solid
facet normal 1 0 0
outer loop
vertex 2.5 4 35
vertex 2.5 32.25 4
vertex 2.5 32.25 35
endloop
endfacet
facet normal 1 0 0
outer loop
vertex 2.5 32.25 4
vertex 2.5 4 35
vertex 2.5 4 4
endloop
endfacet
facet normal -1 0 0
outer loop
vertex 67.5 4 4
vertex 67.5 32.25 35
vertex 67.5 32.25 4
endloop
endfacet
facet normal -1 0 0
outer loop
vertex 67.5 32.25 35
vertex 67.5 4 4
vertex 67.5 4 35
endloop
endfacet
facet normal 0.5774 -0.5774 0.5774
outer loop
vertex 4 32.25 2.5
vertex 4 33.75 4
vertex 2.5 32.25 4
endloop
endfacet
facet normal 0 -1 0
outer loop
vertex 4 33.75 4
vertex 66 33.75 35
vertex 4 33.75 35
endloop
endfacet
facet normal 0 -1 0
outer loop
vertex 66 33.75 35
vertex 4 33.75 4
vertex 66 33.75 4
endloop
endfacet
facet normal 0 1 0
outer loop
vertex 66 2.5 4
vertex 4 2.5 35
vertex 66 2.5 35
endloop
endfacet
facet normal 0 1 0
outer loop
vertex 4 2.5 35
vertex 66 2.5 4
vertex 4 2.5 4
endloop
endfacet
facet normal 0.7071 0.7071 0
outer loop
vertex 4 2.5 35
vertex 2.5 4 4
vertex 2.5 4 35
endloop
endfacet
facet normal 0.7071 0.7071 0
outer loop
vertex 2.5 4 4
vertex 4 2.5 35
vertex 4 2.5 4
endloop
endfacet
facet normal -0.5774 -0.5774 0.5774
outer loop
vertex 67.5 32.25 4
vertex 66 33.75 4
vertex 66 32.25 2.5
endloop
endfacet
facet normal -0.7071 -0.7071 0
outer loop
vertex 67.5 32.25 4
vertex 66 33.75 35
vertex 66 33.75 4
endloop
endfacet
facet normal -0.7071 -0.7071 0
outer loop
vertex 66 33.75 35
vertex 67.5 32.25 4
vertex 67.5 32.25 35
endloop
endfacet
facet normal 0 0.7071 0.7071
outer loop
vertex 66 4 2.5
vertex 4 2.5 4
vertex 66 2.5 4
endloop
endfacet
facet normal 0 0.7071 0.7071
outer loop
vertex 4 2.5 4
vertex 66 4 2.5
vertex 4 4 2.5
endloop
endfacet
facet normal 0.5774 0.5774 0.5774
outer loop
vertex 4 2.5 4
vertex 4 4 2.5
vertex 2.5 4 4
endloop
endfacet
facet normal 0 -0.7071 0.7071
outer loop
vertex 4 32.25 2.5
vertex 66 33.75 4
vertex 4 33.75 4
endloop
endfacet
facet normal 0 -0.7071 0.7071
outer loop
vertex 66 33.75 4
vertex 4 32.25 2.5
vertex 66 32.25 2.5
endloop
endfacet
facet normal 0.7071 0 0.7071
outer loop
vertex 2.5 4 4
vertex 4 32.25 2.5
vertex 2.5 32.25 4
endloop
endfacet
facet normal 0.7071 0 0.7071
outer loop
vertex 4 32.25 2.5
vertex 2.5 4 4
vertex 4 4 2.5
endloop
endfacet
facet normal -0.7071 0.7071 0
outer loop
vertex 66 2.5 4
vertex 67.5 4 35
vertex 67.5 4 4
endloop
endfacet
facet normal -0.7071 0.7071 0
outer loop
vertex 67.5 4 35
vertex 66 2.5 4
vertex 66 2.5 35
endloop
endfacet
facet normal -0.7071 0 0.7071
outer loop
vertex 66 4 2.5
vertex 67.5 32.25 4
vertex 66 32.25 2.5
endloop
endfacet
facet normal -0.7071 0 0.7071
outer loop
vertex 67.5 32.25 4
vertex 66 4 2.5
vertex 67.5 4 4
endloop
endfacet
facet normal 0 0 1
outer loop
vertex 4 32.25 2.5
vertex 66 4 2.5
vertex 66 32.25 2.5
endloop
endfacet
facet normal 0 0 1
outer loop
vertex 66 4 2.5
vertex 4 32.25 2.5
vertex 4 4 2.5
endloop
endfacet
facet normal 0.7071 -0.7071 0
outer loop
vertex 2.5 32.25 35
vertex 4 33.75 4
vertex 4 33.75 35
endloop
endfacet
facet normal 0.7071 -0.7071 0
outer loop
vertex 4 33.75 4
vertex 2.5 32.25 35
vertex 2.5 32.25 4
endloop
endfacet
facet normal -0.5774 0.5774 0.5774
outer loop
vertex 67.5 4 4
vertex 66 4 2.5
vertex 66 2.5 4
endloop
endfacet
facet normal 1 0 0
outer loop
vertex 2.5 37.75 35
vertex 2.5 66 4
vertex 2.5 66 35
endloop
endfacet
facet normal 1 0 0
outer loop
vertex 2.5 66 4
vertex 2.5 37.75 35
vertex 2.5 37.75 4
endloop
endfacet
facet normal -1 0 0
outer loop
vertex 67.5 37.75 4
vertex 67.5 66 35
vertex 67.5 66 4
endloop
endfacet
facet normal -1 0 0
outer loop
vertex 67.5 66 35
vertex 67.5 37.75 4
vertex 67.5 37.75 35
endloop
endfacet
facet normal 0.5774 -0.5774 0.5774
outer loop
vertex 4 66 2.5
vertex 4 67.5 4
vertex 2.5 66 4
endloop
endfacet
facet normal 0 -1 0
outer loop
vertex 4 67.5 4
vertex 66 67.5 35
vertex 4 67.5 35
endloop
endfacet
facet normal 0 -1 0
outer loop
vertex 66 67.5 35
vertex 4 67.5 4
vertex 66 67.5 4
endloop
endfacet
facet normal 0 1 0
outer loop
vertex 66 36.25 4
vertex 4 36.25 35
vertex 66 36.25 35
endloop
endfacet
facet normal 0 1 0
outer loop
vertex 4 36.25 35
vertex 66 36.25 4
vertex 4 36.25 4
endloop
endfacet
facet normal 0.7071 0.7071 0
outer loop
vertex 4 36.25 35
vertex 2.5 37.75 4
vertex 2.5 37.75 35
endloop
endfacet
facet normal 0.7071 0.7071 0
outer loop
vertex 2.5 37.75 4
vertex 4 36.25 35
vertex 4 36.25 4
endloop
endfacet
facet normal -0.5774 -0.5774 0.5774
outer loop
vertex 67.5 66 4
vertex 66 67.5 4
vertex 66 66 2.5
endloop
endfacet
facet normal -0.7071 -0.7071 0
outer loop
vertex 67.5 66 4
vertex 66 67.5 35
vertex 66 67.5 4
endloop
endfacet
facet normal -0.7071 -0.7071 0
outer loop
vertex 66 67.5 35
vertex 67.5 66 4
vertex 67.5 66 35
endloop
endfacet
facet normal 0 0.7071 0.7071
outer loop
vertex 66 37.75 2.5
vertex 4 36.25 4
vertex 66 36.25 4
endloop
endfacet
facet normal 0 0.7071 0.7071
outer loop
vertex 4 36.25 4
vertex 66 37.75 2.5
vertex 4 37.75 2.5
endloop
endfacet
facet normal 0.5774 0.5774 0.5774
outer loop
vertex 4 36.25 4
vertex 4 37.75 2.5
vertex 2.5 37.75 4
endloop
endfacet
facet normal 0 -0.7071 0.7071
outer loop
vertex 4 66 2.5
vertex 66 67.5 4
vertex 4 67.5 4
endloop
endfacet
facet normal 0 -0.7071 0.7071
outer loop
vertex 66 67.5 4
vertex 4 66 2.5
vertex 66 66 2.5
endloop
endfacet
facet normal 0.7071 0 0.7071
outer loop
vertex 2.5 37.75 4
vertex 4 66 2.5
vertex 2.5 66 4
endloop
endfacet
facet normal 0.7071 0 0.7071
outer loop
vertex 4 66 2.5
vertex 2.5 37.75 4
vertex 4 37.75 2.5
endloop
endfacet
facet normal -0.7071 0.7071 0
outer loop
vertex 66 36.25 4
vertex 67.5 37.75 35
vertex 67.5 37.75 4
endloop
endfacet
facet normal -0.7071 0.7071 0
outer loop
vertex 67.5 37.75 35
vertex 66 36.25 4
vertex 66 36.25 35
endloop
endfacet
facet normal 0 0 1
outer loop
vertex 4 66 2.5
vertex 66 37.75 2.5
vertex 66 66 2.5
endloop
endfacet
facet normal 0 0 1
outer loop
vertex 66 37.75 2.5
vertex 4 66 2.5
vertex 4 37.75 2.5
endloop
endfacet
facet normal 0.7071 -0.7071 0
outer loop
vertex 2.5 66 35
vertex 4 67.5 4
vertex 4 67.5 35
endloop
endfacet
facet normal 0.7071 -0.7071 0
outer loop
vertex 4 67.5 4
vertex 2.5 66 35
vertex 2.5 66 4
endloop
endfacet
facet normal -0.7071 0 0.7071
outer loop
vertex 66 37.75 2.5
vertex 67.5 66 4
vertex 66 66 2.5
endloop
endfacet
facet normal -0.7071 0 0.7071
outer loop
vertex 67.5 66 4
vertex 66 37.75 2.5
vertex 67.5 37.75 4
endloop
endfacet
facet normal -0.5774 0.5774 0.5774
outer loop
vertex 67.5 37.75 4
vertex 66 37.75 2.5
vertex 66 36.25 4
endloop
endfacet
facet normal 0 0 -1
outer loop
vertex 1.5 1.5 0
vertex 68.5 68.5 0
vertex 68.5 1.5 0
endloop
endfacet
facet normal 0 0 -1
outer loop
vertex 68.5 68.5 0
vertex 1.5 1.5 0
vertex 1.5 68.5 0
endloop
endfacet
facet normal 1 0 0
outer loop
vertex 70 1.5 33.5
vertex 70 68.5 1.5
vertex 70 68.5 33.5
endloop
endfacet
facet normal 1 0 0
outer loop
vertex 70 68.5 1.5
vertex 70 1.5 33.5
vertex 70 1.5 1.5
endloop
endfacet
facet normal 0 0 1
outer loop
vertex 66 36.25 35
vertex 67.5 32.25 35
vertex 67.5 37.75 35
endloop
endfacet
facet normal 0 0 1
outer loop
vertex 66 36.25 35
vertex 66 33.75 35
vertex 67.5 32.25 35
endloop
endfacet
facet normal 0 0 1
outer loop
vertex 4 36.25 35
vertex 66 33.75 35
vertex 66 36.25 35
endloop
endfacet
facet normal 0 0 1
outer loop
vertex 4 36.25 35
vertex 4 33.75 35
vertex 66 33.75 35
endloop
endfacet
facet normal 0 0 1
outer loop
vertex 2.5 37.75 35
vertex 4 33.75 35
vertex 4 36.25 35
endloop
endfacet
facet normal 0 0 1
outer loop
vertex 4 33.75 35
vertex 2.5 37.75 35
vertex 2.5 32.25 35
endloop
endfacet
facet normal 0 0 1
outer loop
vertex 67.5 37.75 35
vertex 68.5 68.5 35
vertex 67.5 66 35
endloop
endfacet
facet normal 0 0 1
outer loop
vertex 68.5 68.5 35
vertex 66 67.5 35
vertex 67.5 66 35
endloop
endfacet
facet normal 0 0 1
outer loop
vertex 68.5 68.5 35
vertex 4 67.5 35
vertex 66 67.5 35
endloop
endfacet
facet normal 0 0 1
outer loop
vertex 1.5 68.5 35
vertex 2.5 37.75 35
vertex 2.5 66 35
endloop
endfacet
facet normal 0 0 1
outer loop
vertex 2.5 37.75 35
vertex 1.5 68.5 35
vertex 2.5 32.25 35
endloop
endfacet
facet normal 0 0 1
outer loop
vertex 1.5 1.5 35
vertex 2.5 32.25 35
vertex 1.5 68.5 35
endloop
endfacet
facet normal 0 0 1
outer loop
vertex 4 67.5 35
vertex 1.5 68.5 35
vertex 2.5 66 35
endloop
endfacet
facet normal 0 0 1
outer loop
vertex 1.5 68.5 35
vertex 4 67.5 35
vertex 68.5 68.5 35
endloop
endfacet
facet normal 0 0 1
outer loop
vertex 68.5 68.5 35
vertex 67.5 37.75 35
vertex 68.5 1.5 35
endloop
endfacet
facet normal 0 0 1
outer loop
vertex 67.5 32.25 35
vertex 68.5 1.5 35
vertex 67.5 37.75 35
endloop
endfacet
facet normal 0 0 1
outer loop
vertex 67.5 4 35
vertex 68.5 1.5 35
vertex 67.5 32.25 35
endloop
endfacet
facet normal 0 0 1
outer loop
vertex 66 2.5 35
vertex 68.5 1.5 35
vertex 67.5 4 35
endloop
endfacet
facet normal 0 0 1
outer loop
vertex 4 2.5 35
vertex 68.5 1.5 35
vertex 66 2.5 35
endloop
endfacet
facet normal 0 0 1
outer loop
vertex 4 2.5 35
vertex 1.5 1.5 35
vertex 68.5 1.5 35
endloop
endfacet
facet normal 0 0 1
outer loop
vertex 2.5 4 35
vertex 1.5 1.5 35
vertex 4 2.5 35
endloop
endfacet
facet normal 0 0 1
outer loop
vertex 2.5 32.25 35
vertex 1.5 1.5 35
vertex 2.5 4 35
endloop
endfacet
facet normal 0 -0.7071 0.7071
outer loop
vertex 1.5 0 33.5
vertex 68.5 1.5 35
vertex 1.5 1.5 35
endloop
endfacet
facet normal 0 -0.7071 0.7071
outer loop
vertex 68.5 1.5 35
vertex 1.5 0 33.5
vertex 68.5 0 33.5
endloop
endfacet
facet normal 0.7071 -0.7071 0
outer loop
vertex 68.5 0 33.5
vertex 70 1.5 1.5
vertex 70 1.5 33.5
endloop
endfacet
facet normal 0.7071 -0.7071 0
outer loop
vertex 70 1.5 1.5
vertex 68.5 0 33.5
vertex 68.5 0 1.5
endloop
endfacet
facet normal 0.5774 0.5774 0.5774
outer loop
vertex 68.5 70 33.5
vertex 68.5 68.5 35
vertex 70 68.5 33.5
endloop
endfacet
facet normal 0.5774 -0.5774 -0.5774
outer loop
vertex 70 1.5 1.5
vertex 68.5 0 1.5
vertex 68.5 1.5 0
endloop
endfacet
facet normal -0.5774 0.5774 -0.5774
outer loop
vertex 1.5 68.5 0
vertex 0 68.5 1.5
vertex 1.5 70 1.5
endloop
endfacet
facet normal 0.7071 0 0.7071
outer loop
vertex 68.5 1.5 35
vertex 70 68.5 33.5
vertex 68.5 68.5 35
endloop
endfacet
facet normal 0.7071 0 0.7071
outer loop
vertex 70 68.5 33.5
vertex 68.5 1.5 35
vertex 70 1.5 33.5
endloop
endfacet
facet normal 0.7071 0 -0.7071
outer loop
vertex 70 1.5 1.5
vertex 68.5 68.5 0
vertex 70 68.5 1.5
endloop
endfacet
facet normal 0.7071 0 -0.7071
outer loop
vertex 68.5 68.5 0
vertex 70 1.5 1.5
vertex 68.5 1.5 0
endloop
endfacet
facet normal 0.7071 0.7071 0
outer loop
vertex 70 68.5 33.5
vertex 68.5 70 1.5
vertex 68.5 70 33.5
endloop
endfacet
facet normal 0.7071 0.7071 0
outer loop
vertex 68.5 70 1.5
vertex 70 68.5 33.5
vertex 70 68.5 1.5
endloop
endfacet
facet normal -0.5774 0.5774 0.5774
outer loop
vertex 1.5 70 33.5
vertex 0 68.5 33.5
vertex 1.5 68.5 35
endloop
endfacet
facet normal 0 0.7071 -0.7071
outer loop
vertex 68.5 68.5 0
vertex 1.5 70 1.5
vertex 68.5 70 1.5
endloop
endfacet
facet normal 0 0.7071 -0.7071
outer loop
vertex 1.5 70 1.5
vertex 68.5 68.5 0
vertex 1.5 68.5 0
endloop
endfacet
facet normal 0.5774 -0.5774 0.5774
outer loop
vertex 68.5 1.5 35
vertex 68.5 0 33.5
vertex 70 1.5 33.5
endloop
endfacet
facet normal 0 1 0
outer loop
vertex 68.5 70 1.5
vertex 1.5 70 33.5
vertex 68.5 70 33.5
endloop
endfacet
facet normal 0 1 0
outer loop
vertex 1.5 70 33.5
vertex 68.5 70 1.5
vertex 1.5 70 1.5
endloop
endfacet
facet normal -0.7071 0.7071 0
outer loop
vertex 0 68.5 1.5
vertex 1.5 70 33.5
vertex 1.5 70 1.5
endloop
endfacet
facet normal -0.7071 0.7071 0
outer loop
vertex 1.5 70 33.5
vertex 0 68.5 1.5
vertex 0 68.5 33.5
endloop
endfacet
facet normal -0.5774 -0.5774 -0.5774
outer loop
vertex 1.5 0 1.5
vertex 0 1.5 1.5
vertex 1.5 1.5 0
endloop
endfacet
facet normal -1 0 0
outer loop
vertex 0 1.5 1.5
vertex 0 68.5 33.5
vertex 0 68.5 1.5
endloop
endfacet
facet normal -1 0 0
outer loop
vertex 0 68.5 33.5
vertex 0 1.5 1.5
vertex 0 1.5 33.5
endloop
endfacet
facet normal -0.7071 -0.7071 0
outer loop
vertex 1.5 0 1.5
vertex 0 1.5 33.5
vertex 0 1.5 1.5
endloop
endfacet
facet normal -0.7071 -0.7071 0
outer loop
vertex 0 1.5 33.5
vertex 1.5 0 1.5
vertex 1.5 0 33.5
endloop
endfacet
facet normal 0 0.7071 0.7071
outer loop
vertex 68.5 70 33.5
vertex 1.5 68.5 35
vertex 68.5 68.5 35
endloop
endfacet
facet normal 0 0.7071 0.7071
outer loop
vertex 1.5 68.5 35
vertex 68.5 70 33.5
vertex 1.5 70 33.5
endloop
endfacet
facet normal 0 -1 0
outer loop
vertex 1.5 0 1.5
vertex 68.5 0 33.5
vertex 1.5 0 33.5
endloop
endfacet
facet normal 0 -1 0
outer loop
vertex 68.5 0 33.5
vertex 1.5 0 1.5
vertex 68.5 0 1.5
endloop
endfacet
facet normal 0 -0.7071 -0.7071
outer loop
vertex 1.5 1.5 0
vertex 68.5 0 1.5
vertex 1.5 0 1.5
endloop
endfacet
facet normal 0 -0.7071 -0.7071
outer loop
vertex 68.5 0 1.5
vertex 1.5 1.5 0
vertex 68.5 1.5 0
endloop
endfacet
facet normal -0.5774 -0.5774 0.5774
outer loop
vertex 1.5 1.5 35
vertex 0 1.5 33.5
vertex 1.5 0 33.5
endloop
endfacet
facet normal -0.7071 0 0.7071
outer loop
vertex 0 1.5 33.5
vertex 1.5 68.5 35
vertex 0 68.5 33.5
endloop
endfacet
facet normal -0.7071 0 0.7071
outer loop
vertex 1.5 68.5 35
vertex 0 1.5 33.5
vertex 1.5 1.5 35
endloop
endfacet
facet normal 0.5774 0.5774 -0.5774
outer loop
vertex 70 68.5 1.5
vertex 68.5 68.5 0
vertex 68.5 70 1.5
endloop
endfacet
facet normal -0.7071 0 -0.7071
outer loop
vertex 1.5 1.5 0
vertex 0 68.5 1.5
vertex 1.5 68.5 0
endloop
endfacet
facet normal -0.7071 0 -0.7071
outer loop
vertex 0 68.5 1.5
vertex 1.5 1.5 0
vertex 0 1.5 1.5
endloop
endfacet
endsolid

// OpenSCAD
$fn = 90;

/* Dimensions */

width = 70;
height = 35;
wallthickness = 2.5;
divisions = 2;

/* Dimensions */

chamfer = wallthickness/5*3; // 2/sqrt(2);
dividerMultiplier = chamfer; // wallthickness/5*3 or 1.5
    
/**/

module chamferedCube(xyz, chamfer){
  c2 = chamfer * 2;
  a = [xyz[0] - c2, xyz[1] - c2, xyz[2]];
  b = [xyz[0] - c2, xyz[1], xyz[2] - c2];
  c = [xyz[0], xyz[1] - c2, xyz[2] - c2];
  hull(){
    translate([chamfer,chamfer,0])
      cube(a);
    translate([chamfer,0,chamfer])
      cube(b);
    translate([0,chamfer,chamfer])
      cube(c);
    }
  }
	
module dividers(d) {

  t = wallthickness;
	t1 = t*1.5;
	t2 = t/2;
	w = width;
	w2 = width/2;
	w3 = width/3;
	c = chamfer;
	m = dividerMultiplier;
	
  if (d == 1){
		translate([t,t,t])
      chamferedCube([w-t*2,w-t*2,height], c);
    }
  else if (d == 2){
		translate([t,t,t])
      chamferedCube([w-t*2,w2-t*m,height], c);
		translate([t,w/2+t/2,t])
      chamferedCube([w-t*2,w2-t*m,height], c);
    }
  else if (d == 3){
		translate([t,t,t])
      chamferedCube([w-t*2,w3-t*m,height], c);
		translate([t,w3+t/3*2,t])
      chamferedCube([w-t*2,w3-t*m,height], c);
		translate([t,w3*2+t/3,t])
      chamferedCube([w-t*2,w3-t*m,height], c);
    }
  else if (d == 4){
		translate([t,t,t])
      chamferedCube([w2-t*m,w2-t*m,height], c);
		translate([t,w/2+t/2,t])
      chamferedCube([w2-t*m,w2-t*m,height], c);
		translate([w/2+t/2,t,t])
      chamferedCube([w2-t*m,w2-t*m,height], c);
		translate([w/2+t/2,w/2+t/2,t])
      chamferedCube([w2-t*m,w2-t*m,height], c);
    } 
		
  }

/**/

difference(){
  union(){
    chamferedCube([width,width,height], chamfer);
    }
  union(){
		dividers(divisions);
    }
  }
  
/**/
